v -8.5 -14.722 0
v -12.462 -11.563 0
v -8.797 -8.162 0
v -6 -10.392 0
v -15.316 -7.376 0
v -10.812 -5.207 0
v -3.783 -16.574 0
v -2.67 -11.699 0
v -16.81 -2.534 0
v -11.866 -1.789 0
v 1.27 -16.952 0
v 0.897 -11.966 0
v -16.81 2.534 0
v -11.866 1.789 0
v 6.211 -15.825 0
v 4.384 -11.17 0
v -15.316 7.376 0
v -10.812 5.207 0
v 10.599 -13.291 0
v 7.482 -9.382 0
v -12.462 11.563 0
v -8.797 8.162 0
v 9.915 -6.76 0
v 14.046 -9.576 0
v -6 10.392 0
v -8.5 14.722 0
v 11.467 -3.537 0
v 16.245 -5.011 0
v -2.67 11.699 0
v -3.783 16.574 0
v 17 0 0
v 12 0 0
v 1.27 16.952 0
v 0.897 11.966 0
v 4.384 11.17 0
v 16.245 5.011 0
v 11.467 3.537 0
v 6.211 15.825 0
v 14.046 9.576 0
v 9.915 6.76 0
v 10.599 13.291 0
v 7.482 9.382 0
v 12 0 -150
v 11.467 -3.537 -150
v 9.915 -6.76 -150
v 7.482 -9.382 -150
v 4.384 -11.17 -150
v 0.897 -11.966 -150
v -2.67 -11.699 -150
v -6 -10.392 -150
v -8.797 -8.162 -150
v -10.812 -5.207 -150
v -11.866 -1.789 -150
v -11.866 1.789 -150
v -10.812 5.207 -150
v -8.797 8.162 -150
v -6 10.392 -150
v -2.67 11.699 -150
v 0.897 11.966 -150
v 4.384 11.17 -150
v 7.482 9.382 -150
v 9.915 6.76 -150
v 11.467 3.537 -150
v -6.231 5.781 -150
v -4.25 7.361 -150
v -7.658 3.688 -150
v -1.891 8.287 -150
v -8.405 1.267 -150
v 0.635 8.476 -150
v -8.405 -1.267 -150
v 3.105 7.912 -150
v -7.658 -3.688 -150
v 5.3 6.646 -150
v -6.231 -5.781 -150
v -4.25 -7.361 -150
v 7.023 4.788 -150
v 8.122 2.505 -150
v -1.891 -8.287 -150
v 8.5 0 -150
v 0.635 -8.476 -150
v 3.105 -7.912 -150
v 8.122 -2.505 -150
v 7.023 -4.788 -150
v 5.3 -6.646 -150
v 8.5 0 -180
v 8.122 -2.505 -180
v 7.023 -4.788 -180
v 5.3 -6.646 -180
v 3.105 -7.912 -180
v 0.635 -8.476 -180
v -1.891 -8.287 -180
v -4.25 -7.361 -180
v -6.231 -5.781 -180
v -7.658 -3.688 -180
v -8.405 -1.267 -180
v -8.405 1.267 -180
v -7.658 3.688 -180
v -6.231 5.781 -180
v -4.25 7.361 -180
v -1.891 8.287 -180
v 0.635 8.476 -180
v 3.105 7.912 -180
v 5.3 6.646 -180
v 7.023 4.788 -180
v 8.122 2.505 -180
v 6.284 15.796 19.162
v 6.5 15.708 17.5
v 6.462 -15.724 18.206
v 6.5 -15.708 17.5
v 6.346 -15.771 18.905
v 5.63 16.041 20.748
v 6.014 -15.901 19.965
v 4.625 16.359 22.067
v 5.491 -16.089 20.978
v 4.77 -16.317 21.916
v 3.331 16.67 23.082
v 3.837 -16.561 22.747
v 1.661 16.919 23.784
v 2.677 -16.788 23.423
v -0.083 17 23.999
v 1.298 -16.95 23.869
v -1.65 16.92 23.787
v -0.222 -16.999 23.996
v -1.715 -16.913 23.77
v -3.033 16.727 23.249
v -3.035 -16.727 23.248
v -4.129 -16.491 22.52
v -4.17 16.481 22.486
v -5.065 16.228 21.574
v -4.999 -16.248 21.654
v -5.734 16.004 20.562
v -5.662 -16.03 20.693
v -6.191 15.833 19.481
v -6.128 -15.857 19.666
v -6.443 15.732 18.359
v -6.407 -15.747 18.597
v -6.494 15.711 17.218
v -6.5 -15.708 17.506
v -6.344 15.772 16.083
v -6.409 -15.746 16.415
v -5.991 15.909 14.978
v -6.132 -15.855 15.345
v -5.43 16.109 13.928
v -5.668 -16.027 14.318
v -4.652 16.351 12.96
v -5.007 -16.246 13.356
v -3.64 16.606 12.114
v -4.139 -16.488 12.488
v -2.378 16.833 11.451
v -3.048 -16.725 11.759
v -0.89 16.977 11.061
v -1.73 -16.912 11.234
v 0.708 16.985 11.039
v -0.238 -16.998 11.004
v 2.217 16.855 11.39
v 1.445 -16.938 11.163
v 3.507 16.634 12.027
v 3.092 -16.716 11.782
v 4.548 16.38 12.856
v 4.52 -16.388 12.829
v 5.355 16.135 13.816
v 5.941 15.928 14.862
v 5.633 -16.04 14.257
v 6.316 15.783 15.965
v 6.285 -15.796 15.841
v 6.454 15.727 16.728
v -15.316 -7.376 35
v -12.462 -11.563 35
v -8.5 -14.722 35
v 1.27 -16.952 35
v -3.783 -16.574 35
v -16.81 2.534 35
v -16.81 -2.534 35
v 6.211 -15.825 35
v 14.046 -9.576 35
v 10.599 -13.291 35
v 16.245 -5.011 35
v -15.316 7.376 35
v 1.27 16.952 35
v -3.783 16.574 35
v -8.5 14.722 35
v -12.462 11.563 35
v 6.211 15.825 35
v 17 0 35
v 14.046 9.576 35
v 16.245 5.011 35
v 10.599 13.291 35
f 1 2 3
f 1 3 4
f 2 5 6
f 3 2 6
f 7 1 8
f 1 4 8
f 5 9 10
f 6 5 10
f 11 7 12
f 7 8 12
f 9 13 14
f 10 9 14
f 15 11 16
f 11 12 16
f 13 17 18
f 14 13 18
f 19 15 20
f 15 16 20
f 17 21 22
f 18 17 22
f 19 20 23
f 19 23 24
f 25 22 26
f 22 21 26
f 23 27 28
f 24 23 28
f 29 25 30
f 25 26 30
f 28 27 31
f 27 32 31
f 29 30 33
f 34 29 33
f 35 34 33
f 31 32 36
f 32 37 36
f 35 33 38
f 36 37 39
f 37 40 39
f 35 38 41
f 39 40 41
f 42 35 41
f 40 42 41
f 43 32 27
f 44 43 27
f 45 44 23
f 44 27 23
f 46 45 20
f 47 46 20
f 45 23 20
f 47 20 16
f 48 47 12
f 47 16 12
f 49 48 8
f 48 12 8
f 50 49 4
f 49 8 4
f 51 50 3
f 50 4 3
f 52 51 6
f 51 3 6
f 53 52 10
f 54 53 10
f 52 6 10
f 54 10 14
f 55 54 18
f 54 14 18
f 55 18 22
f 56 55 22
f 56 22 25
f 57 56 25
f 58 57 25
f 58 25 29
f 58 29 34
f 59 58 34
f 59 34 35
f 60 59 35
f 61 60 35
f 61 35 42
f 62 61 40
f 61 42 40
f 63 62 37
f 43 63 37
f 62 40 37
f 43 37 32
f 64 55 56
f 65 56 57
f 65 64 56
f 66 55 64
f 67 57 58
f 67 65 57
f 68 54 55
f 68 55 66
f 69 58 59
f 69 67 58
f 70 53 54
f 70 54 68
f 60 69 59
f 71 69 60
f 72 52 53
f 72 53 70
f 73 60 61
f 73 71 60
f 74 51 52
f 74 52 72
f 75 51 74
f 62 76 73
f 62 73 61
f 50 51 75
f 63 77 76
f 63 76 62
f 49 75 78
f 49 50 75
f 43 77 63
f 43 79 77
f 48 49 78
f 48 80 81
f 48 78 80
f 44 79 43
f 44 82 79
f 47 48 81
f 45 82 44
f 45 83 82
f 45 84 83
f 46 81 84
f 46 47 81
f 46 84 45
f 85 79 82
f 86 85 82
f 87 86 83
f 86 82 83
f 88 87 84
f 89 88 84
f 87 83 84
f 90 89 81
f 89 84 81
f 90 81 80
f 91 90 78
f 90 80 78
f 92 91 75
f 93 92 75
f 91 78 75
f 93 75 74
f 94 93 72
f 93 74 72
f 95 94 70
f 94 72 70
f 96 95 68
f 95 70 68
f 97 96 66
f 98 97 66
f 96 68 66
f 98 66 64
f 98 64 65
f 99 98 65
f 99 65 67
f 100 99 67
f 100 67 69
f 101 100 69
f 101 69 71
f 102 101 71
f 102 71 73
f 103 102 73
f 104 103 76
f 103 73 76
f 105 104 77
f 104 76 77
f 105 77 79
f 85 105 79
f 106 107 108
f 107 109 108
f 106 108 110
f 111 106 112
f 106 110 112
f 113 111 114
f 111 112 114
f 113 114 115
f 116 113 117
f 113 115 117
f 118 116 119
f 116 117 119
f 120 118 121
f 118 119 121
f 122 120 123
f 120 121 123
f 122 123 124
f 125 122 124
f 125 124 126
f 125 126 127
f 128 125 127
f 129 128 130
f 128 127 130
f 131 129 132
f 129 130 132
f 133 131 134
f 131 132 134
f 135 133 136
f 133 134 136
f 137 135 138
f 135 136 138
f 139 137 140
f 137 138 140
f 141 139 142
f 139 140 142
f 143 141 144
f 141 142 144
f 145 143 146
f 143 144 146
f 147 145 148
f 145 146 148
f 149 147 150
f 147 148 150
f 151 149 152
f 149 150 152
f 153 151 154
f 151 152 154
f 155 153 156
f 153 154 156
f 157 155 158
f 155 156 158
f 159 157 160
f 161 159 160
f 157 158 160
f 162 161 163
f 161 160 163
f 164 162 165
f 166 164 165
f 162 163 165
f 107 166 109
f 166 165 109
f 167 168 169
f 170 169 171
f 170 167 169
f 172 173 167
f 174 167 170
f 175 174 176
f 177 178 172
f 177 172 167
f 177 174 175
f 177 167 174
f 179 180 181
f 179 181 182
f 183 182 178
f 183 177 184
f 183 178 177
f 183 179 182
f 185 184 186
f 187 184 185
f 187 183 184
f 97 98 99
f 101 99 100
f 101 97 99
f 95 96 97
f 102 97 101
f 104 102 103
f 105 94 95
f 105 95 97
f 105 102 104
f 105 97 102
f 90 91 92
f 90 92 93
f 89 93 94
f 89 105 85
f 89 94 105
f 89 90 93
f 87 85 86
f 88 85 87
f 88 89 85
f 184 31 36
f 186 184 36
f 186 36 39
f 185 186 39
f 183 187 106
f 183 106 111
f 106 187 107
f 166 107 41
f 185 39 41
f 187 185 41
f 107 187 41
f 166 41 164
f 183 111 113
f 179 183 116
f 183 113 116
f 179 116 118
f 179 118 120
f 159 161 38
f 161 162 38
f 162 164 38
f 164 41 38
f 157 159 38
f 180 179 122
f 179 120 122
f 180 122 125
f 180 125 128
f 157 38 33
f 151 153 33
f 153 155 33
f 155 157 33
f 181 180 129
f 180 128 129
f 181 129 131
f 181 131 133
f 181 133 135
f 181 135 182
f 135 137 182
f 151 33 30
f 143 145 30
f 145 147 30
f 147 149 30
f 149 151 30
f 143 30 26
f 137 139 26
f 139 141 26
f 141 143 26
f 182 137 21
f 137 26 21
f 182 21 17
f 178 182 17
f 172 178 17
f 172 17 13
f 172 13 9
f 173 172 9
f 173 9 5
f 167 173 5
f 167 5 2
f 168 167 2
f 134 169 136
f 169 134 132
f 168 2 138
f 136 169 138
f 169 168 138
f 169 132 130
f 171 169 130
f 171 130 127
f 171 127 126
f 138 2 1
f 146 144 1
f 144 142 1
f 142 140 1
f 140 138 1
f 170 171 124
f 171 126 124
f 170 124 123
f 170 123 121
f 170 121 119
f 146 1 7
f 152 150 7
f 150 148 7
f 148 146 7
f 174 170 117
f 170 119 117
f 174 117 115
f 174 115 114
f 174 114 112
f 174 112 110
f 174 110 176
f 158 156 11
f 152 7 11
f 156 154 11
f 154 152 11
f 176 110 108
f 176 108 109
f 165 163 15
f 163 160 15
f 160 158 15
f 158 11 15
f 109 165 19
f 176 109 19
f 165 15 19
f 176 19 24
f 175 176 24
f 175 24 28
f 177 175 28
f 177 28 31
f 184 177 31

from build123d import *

# Parameters (mm, degrees)
SKETCH_R     = 17
PAD_DEPTH    = 35
SKETCH001_R  = 12
PAD001_DEPTH = 150
SKETCH002_R  = 8.5
PAD002_DEPTH = 30
SKETCH003_R  = 6.5
POCKET_DEPTH = 17


with BuildPart() as part:
    # Sketch → Pad (new body)
    with BuildSketch(Plane.XY):
        Circle(SKETCH_R)
    extrude(amount=PAD_DEPTH)

    # Sketch001 (on Face2 of Pad) → Pad001 (join)
    with BuildSketch(Plane(origin=(0, 0, 0), x_dir=(1, 0, 0), z_dir=(0, 0, -1))):
        Circle(SKETCH001_R)
    extrude(amount=PAD001_DEPTH)

    # Sketch002 (on Face5 of Pad001) → Pad002 (join)
    with BuildSketch(Plane(origin=(0, 0, -150), x_dir=(1, 0, 0), z_dir=(0, 0, -1))):
        Circle(SKETCH002_R)
    extrude(amount=PAD002_DEPTH)

    # Sketch003 (on DatumPlane) → Pocket (cut, symmetric)
    with BuildSketch(Plane(origin=(0, 0, 35), x_dir=(1, 0, 0), z_dir=(0, -1, 0))):
        with Locations((0, -17.5)):
            Circle(SKETCH003_R)
    extrude(amount=POCKET_DEPTH, both=True, mode=Mode.SUBTRACT)


solid = part.part
